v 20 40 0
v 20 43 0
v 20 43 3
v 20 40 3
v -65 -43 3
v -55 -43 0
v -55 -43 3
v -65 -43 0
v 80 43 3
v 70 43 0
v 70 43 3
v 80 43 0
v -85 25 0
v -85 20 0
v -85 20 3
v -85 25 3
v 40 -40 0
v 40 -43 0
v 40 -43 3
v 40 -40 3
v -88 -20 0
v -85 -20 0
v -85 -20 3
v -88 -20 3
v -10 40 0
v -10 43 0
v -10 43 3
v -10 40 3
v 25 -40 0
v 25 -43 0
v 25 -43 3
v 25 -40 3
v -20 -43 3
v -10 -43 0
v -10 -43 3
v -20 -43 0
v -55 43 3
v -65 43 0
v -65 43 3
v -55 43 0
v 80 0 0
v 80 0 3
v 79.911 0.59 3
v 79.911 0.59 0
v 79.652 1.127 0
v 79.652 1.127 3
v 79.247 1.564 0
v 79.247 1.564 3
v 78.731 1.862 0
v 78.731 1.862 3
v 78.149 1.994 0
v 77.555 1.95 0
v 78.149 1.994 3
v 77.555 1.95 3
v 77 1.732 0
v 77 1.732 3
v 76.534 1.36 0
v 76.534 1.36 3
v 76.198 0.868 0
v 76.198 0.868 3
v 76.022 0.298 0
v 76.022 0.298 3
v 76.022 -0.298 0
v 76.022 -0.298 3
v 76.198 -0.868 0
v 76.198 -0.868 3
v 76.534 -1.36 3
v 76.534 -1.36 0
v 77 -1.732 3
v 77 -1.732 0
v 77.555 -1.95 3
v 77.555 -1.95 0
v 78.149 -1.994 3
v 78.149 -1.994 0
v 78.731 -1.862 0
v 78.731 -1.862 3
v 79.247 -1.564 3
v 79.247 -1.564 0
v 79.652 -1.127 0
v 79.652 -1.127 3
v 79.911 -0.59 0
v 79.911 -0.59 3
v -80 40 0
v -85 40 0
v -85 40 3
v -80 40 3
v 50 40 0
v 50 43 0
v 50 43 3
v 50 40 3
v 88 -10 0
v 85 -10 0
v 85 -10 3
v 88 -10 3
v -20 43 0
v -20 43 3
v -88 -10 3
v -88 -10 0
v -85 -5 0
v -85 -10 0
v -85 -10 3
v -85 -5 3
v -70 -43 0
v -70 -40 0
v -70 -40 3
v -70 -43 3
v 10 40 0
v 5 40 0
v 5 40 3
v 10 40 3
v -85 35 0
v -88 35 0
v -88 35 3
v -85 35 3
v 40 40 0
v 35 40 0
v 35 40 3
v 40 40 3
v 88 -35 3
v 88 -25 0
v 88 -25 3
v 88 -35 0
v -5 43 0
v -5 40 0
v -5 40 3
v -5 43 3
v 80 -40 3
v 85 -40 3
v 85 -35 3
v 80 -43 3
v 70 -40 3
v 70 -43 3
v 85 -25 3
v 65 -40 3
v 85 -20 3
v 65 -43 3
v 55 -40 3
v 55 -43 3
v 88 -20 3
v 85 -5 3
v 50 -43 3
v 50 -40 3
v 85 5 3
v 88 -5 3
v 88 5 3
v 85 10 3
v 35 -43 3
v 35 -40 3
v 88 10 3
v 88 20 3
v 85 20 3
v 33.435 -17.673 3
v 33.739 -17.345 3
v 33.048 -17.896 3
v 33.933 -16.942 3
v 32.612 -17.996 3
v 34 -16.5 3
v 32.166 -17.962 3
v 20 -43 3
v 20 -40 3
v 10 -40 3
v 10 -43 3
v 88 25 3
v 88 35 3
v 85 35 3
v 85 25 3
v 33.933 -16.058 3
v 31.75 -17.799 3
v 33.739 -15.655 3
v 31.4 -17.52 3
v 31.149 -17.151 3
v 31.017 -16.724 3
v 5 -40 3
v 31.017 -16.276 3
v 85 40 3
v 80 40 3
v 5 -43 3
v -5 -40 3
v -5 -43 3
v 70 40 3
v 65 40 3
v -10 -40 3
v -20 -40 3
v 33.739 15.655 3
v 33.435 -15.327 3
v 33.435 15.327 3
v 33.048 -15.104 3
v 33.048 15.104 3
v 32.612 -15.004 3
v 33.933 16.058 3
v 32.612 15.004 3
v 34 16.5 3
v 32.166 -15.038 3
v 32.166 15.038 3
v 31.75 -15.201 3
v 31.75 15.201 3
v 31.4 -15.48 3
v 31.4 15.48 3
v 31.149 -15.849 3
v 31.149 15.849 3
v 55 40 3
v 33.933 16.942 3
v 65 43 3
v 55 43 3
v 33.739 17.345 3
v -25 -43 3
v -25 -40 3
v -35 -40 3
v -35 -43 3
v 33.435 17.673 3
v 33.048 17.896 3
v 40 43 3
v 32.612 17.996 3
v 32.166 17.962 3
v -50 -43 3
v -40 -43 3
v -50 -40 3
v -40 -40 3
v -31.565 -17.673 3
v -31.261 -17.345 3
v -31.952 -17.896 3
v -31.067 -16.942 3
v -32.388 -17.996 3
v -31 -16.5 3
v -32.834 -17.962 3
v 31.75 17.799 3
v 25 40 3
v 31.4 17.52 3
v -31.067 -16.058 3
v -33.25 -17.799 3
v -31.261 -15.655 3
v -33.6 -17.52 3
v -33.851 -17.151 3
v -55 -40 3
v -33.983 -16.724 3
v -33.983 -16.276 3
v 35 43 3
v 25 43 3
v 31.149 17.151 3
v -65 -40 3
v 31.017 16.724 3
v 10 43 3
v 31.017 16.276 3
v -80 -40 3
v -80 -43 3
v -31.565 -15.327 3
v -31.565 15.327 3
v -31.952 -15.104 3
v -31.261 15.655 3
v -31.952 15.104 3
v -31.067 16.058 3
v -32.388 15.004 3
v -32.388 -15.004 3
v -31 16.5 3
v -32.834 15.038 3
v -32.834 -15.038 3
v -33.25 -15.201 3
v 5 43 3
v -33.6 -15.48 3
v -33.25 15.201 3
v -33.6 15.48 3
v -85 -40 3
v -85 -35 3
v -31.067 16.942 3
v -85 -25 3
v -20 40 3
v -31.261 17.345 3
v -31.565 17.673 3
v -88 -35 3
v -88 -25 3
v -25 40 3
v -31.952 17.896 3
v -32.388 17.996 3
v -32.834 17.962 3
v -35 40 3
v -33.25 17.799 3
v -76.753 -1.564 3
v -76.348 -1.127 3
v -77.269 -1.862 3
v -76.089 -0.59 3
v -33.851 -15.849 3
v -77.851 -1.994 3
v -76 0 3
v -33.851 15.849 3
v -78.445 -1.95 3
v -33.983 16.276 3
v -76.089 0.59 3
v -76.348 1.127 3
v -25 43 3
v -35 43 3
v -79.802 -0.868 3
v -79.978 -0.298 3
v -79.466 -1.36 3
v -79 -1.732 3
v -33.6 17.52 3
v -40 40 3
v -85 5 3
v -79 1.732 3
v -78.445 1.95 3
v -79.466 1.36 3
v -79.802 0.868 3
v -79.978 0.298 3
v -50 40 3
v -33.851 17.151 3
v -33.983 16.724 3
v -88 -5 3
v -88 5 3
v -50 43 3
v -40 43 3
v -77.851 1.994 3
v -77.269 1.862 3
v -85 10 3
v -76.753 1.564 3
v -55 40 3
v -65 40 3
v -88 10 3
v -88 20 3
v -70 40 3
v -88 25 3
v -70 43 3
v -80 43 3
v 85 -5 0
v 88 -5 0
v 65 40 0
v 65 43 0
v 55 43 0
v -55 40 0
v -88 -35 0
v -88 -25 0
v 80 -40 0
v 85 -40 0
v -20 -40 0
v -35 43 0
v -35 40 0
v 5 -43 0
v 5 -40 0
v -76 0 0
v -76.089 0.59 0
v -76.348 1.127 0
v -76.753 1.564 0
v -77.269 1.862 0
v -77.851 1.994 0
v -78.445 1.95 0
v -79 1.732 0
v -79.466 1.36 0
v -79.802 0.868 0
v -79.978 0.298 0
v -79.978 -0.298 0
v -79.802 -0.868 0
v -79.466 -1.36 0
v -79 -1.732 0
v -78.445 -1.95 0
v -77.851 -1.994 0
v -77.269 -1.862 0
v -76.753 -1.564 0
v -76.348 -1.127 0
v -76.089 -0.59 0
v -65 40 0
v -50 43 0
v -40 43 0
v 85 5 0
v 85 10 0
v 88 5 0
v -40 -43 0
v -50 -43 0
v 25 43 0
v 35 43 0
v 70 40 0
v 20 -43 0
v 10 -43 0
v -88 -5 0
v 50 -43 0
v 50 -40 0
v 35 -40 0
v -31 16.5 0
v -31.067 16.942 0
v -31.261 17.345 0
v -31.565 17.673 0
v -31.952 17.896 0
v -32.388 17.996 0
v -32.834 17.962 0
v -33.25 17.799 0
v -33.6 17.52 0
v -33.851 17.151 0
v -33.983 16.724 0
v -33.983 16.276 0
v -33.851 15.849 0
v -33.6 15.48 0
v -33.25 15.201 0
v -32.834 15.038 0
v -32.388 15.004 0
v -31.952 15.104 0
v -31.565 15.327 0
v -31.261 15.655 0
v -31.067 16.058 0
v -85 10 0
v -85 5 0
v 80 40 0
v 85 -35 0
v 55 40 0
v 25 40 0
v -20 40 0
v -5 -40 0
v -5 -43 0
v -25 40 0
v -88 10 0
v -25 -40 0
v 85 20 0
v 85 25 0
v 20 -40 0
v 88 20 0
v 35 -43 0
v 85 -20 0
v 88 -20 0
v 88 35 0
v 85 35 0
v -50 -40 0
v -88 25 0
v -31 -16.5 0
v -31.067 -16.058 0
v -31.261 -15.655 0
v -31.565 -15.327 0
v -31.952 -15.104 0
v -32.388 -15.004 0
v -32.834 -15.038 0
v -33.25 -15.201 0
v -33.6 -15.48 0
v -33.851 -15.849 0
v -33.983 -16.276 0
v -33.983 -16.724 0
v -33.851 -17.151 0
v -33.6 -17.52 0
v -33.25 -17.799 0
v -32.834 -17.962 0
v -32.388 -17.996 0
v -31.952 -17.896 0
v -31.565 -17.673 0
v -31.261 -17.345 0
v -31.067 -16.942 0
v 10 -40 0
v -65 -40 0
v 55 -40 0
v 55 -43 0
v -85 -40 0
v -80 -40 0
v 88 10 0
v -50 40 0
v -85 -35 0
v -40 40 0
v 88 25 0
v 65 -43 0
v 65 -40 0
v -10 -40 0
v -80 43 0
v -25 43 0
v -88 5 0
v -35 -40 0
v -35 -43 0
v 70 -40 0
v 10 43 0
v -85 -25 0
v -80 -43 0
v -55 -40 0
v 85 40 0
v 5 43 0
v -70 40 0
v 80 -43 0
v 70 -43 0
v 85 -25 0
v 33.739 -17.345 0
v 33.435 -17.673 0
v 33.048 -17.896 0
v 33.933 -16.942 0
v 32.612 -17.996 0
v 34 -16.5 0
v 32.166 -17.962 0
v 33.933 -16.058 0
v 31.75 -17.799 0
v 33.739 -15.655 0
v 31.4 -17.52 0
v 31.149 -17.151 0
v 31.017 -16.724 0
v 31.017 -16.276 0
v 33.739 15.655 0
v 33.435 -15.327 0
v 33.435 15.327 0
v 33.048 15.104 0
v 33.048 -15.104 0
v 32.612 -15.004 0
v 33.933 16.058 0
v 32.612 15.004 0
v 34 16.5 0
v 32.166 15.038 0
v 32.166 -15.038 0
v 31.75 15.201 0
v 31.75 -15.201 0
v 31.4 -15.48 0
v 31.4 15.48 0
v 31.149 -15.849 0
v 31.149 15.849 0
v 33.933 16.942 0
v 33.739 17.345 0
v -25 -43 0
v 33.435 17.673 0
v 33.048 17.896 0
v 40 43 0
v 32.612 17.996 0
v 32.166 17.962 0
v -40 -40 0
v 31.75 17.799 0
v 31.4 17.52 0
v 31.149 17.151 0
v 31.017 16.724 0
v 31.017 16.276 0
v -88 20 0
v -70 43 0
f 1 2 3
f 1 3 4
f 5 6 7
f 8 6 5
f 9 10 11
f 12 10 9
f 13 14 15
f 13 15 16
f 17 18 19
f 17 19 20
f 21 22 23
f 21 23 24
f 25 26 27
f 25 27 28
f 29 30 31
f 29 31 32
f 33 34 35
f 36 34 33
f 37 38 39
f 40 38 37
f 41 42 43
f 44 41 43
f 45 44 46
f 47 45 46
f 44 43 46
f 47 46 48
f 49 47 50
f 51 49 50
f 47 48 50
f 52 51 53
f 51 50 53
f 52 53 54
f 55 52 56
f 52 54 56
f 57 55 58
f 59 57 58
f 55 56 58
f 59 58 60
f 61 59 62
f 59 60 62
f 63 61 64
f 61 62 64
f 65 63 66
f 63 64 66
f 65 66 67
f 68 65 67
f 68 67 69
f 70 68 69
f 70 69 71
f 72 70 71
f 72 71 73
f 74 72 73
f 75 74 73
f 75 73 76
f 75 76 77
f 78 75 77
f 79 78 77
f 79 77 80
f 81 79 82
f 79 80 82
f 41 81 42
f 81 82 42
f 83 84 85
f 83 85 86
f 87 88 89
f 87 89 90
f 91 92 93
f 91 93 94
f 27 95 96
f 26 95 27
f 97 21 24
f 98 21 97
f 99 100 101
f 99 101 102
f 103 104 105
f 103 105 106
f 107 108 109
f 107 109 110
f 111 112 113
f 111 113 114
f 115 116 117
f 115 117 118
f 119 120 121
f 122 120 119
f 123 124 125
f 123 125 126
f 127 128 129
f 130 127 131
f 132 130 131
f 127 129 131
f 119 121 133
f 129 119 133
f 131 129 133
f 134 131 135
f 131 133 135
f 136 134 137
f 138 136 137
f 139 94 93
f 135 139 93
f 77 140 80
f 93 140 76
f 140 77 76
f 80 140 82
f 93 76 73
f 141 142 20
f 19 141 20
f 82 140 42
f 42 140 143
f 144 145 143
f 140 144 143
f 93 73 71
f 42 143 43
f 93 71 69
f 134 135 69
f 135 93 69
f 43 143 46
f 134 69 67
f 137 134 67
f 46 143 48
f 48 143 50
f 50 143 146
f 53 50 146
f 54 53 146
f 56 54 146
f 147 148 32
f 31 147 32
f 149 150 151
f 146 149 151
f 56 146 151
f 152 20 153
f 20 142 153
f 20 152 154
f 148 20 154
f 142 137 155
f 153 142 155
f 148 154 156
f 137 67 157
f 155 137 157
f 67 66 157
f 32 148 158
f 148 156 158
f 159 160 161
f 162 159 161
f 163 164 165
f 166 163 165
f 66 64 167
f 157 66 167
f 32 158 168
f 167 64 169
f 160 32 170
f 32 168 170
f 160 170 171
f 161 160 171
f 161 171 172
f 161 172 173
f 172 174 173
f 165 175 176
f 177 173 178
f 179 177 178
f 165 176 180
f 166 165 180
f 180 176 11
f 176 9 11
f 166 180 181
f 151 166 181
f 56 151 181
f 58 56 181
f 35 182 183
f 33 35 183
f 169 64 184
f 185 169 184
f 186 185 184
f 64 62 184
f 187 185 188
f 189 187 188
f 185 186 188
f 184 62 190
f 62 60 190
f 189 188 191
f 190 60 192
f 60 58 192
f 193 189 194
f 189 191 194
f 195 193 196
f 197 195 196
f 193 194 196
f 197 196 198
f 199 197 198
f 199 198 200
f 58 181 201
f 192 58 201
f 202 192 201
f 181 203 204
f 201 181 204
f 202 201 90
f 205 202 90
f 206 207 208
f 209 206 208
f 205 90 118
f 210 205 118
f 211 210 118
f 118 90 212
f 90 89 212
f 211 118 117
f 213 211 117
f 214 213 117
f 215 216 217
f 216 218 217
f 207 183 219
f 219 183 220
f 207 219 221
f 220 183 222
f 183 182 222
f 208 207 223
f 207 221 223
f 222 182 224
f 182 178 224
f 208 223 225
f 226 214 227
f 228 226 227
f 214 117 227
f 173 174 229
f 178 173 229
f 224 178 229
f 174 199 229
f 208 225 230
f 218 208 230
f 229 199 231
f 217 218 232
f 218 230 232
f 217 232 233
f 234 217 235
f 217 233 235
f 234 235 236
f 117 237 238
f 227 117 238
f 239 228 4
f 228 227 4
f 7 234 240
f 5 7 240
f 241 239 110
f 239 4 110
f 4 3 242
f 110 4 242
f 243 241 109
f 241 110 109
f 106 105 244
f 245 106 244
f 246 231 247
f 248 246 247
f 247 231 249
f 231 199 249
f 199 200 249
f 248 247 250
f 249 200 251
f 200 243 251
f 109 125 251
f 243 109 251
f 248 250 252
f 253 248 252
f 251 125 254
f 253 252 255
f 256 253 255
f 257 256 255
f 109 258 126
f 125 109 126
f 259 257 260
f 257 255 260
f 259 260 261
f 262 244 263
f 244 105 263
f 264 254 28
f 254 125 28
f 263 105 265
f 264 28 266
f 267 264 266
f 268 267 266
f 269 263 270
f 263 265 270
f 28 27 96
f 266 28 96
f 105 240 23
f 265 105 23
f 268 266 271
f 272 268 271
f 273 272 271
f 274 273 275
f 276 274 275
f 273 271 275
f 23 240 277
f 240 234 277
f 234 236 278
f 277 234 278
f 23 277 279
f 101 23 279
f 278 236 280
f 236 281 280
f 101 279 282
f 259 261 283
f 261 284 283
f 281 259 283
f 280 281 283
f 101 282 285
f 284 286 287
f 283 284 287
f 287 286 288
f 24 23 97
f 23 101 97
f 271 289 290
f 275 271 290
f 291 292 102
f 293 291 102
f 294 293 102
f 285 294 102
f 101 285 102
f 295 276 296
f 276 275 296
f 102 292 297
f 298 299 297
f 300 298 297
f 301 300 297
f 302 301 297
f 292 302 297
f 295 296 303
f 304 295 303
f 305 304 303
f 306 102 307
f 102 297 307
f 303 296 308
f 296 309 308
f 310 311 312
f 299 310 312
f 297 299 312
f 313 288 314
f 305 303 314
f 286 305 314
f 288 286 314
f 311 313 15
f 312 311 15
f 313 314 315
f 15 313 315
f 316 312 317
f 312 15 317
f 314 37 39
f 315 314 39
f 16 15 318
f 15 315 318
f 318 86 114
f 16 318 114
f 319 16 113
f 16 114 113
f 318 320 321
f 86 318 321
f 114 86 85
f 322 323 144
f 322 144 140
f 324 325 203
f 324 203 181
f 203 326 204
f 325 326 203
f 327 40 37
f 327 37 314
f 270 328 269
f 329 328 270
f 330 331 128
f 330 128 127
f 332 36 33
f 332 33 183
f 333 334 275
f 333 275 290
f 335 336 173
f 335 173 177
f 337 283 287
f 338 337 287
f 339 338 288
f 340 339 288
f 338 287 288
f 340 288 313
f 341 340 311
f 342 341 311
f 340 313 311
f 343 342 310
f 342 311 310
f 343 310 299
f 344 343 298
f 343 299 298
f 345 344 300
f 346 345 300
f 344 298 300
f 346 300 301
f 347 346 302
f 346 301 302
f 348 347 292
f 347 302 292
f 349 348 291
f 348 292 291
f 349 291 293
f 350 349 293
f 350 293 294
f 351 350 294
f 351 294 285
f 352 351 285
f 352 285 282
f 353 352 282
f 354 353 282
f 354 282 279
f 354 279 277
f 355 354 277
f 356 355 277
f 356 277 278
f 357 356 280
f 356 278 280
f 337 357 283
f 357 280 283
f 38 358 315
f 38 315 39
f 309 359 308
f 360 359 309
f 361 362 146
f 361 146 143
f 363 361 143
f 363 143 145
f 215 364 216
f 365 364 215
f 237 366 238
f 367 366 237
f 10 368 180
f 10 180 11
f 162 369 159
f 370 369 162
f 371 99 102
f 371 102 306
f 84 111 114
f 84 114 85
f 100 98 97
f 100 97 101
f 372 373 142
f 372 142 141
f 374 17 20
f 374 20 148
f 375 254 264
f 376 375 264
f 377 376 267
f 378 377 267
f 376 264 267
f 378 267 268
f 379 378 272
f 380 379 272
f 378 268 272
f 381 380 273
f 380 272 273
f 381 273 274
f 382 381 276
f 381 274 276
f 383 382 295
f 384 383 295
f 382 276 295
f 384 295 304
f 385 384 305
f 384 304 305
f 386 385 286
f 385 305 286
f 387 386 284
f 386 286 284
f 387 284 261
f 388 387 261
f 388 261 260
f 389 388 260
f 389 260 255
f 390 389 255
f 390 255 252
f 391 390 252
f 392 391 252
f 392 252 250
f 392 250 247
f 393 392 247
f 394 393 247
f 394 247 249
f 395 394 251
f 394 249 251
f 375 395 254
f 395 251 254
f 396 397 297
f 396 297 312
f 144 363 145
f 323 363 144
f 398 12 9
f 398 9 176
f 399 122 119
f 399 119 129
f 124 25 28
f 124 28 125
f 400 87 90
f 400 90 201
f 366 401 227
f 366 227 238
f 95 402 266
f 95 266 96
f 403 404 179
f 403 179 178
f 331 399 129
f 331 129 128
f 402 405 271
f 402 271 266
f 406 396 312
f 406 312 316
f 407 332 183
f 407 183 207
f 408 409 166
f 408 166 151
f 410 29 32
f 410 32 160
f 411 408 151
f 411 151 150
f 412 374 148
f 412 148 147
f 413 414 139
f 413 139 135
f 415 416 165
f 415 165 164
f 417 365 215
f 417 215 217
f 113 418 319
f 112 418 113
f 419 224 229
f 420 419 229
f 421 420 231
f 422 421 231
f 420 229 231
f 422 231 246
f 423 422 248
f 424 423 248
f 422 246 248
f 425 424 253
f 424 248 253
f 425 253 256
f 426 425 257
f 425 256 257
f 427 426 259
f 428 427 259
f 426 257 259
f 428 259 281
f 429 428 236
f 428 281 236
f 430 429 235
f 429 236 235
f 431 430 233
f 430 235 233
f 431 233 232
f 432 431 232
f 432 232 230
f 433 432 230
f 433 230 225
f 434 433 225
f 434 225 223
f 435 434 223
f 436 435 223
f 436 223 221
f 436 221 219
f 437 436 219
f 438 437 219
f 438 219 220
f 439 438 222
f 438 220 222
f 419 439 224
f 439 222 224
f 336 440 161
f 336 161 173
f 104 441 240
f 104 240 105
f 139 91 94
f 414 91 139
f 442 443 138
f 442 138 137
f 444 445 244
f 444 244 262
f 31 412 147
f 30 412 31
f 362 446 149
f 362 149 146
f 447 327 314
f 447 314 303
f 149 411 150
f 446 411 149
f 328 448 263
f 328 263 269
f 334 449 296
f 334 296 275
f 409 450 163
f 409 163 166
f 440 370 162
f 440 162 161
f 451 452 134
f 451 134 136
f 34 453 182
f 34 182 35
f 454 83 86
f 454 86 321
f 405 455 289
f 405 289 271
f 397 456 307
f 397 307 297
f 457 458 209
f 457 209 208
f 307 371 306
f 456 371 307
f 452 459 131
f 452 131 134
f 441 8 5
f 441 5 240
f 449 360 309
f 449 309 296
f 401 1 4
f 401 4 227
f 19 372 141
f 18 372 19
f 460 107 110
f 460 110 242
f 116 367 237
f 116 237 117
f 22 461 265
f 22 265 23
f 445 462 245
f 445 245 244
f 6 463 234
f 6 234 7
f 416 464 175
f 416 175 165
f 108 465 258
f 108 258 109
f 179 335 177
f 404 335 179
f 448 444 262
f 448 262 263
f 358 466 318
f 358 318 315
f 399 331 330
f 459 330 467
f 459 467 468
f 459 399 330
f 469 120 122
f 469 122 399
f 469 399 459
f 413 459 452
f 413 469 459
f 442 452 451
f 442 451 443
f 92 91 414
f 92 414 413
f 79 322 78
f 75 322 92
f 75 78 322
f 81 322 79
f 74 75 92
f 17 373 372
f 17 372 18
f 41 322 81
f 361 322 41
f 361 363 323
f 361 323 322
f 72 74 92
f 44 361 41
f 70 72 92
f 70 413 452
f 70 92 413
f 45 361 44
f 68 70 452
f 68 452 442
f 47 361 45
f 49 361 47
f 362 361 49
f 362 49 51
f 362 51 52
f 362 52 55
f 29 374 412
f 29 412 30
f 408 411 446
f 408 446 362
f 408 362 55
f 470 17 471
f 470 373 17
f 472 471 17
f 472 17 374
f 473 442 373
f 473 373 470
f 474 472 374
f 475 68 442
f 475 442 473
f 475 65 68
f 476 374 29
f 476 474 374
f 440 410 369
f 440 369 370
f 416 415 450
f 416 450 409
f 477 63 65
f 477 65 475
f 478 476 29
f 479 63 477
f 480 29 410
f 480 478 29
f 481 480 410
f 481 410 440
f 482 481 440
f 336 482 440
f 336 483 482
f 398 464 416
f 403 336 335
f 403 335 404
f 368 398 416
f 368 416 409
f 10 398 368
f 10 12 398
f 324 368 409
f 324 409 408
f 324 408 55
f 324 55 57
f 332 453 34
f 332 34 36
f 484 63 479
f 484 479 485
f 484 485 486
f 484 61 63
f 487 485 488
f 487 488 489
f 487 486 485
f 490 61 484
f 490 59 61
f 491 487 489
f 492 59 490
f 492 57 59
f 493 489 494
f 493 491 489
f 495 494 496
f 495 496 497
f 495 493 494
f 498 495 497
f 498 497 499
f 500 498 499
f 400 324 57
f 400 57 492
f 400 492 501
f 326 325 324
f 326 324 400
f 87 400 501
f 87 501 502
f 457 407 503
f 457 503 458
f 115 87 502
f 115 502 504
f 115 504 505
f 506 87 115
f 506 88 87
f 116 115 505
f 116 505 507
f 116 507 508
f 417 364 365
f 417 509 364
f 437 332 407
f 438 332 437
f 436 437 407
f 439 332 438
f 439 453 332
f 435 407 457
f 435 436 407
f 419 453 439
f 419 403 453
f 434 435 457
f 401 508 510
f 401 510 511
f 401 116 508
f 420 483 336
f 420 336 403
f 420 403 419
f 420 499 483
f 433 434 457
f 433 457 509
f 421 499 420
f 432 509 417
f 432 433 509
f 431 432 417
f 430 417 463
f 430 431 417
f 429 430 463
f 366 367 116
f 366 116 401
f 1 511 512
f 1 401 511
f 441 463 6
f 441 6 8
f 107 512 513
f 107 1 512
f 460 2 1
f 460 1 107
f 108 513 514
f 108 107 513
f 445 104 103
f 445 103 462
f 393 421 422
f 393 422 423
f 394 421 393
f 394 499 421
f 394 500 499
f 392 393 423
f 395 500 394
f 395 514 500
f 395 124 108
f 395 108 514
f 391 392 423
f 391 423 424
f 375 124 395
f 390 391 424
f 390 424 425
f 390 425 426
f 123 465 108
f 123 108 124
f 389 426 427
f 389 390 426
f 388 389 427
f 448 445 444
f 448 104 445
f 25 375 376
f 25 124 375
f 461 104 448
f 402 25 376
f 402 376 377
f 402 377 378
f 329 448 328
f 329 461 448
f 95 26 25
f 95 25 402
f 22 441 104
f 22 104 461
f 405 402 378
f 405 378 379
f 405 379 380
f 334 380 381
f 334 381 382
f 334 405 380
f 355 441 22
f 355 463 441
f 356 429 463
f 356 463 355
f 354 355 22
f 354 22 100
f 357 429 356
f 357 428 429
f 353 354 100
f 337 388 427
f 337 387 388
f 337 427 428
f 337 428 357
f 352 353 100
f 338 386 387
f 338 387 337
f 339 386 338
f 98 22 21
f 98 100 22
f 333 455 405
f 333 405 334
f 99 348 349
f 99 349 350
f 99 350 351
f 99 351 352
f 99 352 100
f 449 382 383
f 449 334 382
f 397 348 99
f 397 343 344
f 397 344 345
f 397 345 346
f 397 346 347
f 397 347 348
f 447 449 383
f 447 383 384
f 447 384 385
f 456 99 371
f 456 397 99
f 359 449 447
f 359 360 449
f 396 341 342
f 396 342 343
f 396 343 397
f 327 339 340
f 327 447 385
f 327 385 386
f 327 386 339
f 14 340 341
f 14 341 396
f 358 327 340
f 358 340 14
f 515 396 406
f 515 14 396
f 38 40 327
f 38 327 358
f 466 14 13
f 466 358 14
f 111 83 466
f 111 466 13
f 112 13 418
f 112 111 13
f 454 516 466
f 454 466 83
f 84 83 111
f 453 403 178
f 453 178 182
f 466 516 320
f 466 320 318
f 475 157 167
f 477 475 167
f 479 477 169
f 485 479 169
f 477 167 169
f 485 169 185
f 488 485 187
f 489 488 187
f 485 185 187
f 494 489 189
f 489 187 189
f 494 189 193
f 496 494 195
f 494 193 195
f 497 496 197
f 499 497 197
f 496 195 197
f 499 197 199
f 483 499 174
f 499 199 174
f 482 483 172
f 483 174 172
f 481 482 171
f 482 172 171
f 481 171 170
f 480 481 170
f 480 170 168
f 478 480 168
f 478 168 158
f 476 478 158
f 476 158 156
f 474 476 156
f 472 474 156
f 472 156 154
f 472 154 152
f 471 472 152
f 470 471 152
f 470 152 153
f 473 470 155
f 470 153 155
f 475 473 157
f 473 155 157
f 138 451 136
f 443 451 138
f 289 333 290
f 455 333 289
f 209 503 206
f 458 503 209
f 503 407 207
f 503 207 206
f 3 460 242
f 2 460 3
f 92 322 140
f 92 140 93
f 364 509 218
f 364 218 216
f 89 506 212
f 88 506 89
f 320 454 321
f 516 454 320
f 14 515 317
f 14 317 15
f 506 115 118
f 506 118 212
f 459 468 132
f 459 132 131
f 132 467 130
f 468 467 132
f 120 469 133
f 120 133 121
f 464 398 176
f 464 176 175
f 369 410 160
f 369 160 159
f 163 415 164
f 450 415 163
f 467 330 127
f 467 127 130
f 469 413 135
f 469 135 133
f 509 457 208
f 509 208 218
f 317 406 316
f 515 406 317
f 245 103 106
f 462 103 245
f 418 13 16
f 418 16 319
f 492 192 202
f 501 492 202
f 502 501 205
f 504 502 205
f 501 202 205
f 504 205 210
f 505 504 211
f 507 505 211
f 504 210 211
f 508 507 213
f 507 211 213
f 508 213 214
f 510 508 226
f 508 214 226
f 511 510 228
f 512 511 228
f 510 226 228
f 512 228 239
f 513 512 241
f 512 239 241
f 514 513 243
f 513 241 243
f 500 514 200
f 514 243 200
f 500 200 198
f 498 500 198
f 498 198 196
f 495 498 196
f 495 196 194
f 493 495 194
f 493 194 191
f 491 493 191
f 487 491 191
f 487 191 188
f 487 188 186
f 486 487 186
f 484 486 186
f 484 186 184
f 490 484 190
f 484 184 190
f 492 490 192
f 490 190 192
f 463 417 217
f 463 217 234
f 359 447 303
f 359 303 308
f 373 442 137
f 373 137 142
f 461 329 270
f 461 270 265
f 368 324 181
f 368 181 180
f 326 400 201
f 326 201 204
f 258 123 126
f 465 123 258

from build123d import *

# Parameters (mm, degrees)
EXTRUDE_1_DEPTH     = 3
SKETCH_3_R          = 1.5
CUT_EXTRUDE_2_DEPTH = 3
SKETCH_4_R          = 2
CUT_EXTRUDE_3_DEPTH = 3


with BuildPart() as part:
    # 草图2 → 凸台-拉伸1 (new body)
    with BuildSketch(Plane.XY):
        Polygon((-85, 40), (-80, 40), (-80, 43), (-70, 43), (-70, 40), (-65, 40), (-65, 43), (-55, 43), (-55, 40), (-50, 40), (-50, 43), (-40, 43), (-40, 40), (-35, 40), (-35, 43), (-25, 43), (-25, 40), (-20, 40), (-20, 43), (-10, 43), (-10, 40), (-5, 40), (-5, 43), (5, 43), (5, 40), (10, 40), (10, 43), (20, 43), (20, 40), (25, 40), (25, 43), (35, 43), (35, 40), (40, 40), (40, 43), (50, 43), (50, 40), (55, 40), (55, 43), (65, 43), (65, 40), (70, 40), (70, 43), (80, 43), (80, 40), (85, 40), (85, 35), (88, 35), (88, 25), (85, 25), (85, 20), (88, 20), (88, 10), (85, 10), (85, 5), (88, 5), (88, -5), (85, -5), (85, -10), (88, -10), (88, -20), (85, -20), (85, -25), (88, -25), (88, -35), (85, -35), (85, -40), (80, -40), (80, -43), (70, -43), (70, -40), (65, -40), (65, -43), (55, -43), (55, -40), (50, -40), (50, -43), (40, -43), (40, -40), (35, -40), (35, -43), (25, -43), (25, -40), (20, -40), (20, -43), (10, -43), (10, -40), (5, -40), (5, -43), (-5, -43), (-5, -40), (-10, -40), (-10, -43), (-20, -43), (-20, -40), (-25, -40), (-25, -43), (-35, -43), (-35, -40), (-40, -40), (-40, -43), (-50, -43), (-50, -40), (-55, -40), (-55, -43), (-65, -43), (-65, -40), (-70, -40), (-70, -43), (-80, -43), (-80, -40), (-85, -40), (-85, -35), (-88, -35), (-88, -25), (-85, -25), (-85, -20), (-88, -20), (-88, -10), (-85, -10), (-85, -5), (-88, -5), (-88, 5), (-85, 5), (-85, 10), (-88, 10), (-88, 20), (-85, 20), (-85, 25), (-88, 25), (-88, 35), (-85, 35), align=None)
    extrude(amount=EXTRUDE_1_DEPTH)

    # 草图3 → 切除-拉伸2 (cut)
    with BuildSketch(Plane.XY.offset(3)):
        with Locations((-32.5, 16.5)):
            Circle(SKETCH_3_R)
        with Locations((32.5, 16.5)):
            Circle(SKETCH_3_R)
        with Locations((32.5, -16.5)):
            Circle(SKETCH_3_R)
        with Locations((-32.5, -16.5)):
            Circle(SKETCH_3_R)
    extrude(amount=-CUT_EXTRUDE_2_DEPTH, mode=Mode.SUBTRACT)

    # 草图4 → 切除-拉伸3 (cut)
    with BuildSketch(Plane.XY.offset(3)):
        with Locations((78, 0)):
            Circle(SKETCH_4_R)
        with Locations((-78, 0)):
            Circle(SKETCH_4_R)
    extrude(amount=-CUT_EXTRUDE_3_DEPTH, mode=Mode.SUBTRACT)


solid = part.part
